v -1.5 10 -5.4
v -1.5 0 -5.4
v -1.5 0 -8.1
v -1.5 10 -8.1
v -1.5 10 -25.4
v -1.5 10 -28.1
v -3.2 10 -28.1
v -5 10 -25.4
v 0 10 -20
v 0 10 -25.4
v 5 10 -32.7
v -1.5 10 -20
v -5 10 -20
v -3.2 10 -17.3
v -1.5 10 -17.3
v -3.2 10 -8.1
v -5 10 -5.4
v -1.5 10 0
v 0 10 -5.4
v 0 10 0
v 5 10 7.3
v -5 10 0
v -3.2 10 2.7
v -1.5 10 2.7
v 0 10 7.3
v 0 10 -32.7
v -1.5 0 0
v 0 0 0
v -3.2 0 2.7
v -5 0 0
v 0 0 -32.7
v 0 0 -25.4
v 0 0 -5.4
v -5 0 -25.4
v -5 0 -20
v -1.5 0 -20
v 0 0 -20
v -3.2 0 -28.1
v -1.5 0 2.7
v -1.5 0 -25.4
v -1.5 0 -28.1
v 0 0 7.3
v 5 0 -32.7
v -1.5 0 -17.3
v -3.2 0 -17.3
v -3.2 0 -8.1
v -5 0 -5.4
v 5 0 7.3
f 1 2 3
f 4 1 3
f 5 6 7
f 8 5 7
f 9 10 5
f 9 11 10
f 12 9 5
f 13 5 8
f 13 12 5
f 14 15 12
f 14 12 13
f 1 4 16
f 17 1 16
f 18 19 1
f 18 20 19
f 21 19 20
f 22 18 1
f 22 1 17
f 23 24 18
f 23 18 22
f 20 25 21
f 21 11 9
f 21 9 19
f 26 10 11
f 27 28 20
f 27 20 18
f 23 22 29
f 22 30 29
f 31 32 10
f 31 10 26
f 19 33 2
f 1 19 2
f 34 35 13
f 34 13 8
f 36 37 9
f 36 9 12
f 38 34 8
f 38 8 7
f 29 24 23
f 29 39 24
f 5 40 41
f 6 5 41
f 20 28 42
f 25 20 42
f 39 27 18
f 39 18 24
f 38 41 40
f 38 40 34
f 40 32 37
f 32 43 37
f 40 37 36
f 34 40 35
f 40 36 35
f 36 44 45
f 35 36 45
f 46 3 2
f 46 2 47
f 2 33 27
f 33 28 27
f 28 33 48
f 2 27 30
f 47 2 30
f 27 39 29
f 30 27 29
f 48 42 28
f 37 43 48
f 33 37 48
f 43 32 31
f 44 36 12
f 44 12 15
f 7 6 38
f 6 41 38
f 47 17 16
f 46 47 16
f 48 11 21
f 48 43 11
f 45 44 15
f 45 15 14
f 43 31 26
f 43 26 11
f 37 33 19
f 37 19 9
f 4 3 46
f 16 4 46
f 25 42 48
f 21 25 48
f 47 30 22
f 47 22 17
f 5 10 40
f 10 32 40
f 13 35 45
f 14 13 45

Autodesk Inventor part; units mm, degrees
ref_plane "YZ Plane" through (0, 0, 0) normal (1, 0, 0) x (0, 1, 0)
ref_plane "XZ Plane" through (0, 0, 0) normal (0, 1, 0) x (-1, 0, 0)
ref_plane "XY Plane" through (0, 0, 0) normal (0, 0, 1) x (1, 0, 0)
sketch "Sketch1" plane through (0, 0, 0) normal (0, 1, 0) x (-1, 0, 0)
  line L0 (0, -5.4) -> (1.5, -5.4)
  line L1 (1.5, -5.4) -> (1.5, -8.1)
  line L2 (1.5, -8.1) -> (3.2, -8.1)
  line L3 (0, 0) -> (1.5, 0)
  line L4 (1.5, 0) -> (1.5, 2.7)
  line L5 (1.5, 2.7) -> (3.2, 2.7)
  line L6 (5, 0) -> (5, -5.4)
  line L7 (5, -5.4) -> (3.2, -8.1)
  line L8 (5, 0) -> (3.2, 2.7)
  line L9 (0, -20) -> (1.5, -20)
  line L10 (1.5, -20) -> (1.5, -17.3)
  line L11 (1.5, -17.3) -> (3.2, -17.3)
  line L12 (0, -25.4) -> (1.5, -25.4)
  line L13 (1.5, -25.4) -> (1.5, -28.1)
  line L14 (1.5, -28.1) -> (3.2, -28.1)
  line L15 (5, -20) -> (5, -25.4)
  line L16 (5, -25.4) -> (3.2, -28.1)
  line L17 (5, -20) -> (3.2, -17.3)
  line L18 (0, -5.4) -> (0, -20)
  line L19 (0, 0) -> (0, 7.3)
  line L20 (0, 7.3) -> (-5, 7.3)
  line L21 (0, -25.4) -> (0, -32.7)
  line L22 (0, -32.7) -> (-5, -32.7)
  line L23 (-5, -32.7) -> (-5, 7.3)
  dimension "d0" = 5.4
  dimension "d1" = 1.5
  dimension "d2" = 2.7
  dimension "d3" = 1.7
  dimension "d4" = 2.7
  dimension "d5" = 1.7
  dimension "d9" = 2.7
  dimension "d10" = 2.7
  dimension "d11" = 5.4
  dimension "d12" = 7.3
  dimension "d13" = 5
  dimension "d14" = 7.3
  dimension "d15" = 5
  dimension "d16" = 20
extrude "Extrusion1" add sketch "Sketch1" along normal blind 10
properties part number "slotmountingPlate_dual"
